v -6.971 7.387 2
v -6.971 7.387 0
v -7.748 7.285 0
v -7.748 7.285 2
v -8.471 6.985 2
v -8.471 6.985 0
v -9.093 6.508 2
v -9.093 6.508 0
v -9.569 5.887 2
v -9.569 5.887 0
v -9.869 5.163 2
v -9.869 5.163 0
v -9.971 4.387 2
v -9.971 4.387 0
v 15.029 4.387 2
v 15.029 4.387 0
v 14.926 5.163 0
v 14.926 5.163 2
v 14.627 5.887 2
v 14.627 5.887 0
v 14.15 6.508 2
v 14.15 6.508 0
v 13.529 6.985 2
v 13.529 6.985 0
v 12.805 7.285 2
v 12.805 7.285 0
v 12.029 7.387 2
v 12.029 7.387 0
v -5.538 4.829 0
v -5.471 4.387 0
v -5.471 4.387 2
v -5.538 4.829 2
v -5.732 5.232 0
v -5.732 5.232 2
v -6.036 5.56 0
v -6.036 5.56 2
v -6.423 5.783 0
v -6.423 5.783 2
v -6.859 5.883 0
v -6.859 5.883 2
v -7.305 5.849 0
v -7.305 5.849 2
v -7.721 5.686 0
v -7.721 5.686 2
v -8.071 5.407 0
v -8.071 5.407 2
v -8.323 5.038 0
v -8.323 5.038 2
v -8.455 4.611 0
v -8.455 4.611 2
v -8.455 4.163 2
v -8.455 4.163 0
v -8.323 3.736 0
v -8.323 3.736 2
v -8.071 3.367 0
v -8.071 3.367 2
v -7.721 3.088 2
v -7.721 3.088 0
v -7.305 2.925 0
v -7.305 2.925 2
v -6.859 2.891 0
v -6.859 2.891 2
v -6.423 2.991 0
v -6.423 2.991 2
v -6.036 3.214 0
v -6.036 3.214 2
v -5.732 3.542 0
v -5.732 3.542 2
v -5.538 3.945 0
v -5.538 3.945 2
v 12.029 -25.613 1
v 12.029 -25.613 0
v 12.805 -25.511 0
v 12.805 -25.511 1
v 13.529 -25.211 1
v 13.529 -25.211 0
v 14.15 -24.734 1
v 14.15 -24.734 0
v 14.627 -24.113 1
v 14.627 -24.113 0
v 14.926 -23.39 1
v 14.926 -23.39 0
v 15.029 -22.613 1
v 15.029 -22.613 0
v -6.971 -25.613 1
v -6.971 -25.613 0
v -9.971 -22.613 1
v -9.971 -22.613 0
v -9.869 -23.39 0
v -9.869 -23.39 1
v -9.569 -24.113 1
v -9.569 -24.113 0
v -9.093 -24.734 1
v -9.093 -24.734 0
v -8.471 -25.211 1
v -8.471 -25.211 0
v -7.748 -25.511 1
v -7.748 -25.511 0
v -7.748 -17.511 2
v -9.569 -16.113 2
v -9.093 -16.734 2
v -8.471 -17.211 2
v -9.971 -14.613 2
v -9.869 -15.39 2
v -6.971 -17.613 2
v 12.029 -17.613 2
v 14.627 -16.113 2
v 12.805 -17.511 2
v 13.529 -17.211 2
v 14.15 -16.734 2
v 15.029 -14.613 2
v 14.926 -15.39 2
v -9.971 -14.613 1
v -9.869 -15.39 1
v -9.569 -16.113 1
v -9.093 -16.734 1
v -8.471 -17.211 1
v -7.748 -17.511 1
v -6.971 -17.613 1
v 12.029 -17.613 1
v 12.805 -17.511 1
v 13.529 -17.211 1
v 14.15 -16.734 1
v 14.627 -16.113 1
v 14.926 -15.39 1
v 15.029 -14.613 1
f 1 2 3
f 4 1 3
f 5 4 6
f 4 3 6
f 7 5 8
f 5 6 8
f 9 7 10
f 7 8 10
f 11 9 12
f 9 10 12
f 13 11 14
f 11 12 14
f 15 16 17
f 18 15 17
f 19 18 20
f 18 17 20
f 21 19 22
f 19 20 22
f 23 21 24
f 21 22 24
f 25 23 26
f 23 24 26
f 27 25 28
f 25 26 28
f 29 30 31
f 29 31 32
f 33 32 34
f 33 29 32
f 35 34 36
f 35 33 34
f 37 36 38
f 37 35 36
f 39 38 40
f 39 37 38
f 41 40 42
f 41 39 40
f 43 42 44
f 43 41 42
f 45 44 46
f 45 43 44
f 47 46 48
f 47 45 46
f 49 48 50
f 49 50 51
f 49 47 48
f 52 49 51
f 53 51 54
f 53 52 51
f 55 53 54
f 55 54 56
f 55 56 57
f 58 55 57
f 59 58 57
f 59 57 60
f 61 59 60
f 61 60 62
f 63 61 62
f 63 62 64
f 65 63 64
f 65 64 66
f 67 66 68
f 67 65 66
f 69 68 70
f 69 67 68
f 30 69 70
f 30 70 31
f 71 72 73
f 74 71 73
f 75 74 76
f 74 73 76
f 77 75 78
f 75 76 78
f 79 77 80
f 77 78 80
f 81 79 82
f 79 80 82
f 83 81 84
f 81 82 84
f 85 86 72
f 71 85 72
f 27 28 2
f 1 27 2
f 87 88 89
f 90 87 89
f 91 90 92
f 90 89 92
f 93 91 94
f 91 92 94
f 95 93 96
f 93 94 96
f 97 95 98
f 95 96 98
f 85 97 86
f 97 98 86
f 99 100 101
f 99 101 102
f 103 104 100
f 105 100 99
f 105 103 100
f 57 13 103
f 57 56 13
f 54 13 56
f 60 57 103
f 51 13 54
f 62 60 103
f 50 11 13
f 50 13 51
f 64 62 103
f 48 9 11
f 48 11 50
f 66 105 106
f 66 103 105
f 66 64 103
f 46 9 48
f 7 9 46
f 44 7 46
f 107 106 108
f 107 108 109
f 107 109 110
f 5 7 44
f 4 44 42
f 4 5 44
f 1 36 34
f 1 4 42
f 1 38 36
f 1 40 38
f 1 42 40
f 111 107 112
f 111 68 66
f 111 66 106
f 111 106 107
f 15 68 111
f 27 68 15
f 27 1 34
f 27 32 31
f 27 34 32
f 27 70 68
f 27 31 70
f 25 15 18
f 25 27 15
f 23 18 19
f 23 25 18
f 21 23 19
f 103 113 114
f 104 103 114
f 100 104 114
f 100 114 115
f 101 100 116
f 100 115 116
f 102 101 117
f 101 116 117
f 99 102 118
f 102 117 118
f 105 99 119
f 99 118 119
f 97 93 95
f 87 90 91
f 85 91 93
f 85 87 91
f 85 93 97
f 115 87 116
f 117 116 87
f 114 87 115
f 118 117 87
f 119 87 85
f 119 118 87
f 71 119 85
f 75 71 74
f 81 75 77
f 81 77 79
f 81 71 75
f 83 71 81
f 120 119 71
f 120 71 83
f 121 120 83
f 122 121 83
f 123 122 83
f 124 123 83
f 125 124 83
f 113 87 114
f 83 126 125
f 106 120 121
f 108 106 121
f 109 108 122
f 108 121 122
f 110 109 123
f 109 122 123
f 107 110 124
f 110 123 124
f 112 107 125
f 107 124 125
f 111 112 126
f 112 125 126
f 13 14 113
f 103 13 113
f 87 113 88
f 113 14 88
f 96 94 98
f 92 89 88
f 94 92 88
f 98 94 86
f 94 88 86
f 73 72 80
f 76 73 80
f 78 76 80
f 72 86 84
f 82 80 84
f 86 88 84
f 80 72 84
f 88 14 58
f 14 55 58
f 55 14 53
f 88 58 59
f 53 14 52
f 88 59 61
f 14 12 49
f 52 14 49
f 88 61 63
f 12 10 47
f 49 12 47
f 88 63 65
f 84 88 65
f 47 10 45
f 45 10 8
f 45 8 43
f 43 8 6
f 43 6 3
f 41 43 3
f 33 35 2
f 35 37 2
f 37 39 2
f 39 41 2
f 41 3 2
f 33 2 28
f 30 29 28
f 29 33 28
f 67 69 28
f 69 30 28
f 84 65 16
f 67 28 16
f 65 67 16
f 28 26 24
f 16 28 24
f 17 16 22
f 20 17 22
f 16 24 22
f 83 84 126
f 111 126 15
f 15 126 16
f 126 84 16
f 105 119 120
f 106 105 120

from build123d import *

# Parameters (mm, degrees)
F0_R     = 1.5
F1_DEPTH = 2
F2_DEPTH = 1


with BuildPart() as f1:
    # F0 (on Top) → F1 (new body)
    with BuildSketch(Plane.XY):
        with BuildLine():
            Line((12.028635, 7.386944), (-6.971365, 7.386944))
            ThreePointArc((-6.971365, 7.386944), (-9.092685, 6.508265), (-9.971365, 4.386944))
            Line((-9.971365, 4.386944), (-9.971365, -14.613056))
            ThreePointArc((-9.971365, -14.613056), (-9.092685, -16.734376), (-6.971365, -17.613056))
            Line((-6.971365, -17.613056), (12.028635, -17.613056))
            ThreePointArc((12.028635, -17.613056), (14.149955, -16.734376), (15.028635, -14.613056))
            Line((15.028635, -14.613056), (15.028635, 4.386944))
            ThreePointArc((15.028635, 4.386944), (14.149955, 6.508265), (12.028635, 7.386944))
        make_face()
        with Locations((-6.971365, 4.386944)):
            Circle(F0_R, mode=Mode.SUBTRACT)
    extrude(amount=F1_DEPTH)

    # F0 (on Top) → F2 (join)
    with BuildSketch(Plane.XY):
        with BuildLine():
            ThreePointArc((-6.971365, -17.613056), (-9.092685, -16.734376), (-9.971365, -14.613056))
            Line((-9.971365, -14.613056), (-9.971365, -22.613056))
            ThreePointArc((-9.971365, -22.613056), (-9.092685, -24.734376), (-6.971365, -25.613056))
            Line((-6.971365, -25.613056), (12.028635, -25.613056))
            ThreePointArc((12.028635, -25.613056), (14.149955, -24.734376), (15.028635, -22.613056))
            Line((15.028635, -22.613056), (15.028635, -14.613056))
            ThreePointArc((15.028635, -14.613056), (14.149955, -16.734376), (12.028635, -17.613056))
            Line((12.028635, -17.613056), (-6.971365, -17.613056))
        make_face()
    extrude(amount=F2_DEPTH)


solid = f1.part
